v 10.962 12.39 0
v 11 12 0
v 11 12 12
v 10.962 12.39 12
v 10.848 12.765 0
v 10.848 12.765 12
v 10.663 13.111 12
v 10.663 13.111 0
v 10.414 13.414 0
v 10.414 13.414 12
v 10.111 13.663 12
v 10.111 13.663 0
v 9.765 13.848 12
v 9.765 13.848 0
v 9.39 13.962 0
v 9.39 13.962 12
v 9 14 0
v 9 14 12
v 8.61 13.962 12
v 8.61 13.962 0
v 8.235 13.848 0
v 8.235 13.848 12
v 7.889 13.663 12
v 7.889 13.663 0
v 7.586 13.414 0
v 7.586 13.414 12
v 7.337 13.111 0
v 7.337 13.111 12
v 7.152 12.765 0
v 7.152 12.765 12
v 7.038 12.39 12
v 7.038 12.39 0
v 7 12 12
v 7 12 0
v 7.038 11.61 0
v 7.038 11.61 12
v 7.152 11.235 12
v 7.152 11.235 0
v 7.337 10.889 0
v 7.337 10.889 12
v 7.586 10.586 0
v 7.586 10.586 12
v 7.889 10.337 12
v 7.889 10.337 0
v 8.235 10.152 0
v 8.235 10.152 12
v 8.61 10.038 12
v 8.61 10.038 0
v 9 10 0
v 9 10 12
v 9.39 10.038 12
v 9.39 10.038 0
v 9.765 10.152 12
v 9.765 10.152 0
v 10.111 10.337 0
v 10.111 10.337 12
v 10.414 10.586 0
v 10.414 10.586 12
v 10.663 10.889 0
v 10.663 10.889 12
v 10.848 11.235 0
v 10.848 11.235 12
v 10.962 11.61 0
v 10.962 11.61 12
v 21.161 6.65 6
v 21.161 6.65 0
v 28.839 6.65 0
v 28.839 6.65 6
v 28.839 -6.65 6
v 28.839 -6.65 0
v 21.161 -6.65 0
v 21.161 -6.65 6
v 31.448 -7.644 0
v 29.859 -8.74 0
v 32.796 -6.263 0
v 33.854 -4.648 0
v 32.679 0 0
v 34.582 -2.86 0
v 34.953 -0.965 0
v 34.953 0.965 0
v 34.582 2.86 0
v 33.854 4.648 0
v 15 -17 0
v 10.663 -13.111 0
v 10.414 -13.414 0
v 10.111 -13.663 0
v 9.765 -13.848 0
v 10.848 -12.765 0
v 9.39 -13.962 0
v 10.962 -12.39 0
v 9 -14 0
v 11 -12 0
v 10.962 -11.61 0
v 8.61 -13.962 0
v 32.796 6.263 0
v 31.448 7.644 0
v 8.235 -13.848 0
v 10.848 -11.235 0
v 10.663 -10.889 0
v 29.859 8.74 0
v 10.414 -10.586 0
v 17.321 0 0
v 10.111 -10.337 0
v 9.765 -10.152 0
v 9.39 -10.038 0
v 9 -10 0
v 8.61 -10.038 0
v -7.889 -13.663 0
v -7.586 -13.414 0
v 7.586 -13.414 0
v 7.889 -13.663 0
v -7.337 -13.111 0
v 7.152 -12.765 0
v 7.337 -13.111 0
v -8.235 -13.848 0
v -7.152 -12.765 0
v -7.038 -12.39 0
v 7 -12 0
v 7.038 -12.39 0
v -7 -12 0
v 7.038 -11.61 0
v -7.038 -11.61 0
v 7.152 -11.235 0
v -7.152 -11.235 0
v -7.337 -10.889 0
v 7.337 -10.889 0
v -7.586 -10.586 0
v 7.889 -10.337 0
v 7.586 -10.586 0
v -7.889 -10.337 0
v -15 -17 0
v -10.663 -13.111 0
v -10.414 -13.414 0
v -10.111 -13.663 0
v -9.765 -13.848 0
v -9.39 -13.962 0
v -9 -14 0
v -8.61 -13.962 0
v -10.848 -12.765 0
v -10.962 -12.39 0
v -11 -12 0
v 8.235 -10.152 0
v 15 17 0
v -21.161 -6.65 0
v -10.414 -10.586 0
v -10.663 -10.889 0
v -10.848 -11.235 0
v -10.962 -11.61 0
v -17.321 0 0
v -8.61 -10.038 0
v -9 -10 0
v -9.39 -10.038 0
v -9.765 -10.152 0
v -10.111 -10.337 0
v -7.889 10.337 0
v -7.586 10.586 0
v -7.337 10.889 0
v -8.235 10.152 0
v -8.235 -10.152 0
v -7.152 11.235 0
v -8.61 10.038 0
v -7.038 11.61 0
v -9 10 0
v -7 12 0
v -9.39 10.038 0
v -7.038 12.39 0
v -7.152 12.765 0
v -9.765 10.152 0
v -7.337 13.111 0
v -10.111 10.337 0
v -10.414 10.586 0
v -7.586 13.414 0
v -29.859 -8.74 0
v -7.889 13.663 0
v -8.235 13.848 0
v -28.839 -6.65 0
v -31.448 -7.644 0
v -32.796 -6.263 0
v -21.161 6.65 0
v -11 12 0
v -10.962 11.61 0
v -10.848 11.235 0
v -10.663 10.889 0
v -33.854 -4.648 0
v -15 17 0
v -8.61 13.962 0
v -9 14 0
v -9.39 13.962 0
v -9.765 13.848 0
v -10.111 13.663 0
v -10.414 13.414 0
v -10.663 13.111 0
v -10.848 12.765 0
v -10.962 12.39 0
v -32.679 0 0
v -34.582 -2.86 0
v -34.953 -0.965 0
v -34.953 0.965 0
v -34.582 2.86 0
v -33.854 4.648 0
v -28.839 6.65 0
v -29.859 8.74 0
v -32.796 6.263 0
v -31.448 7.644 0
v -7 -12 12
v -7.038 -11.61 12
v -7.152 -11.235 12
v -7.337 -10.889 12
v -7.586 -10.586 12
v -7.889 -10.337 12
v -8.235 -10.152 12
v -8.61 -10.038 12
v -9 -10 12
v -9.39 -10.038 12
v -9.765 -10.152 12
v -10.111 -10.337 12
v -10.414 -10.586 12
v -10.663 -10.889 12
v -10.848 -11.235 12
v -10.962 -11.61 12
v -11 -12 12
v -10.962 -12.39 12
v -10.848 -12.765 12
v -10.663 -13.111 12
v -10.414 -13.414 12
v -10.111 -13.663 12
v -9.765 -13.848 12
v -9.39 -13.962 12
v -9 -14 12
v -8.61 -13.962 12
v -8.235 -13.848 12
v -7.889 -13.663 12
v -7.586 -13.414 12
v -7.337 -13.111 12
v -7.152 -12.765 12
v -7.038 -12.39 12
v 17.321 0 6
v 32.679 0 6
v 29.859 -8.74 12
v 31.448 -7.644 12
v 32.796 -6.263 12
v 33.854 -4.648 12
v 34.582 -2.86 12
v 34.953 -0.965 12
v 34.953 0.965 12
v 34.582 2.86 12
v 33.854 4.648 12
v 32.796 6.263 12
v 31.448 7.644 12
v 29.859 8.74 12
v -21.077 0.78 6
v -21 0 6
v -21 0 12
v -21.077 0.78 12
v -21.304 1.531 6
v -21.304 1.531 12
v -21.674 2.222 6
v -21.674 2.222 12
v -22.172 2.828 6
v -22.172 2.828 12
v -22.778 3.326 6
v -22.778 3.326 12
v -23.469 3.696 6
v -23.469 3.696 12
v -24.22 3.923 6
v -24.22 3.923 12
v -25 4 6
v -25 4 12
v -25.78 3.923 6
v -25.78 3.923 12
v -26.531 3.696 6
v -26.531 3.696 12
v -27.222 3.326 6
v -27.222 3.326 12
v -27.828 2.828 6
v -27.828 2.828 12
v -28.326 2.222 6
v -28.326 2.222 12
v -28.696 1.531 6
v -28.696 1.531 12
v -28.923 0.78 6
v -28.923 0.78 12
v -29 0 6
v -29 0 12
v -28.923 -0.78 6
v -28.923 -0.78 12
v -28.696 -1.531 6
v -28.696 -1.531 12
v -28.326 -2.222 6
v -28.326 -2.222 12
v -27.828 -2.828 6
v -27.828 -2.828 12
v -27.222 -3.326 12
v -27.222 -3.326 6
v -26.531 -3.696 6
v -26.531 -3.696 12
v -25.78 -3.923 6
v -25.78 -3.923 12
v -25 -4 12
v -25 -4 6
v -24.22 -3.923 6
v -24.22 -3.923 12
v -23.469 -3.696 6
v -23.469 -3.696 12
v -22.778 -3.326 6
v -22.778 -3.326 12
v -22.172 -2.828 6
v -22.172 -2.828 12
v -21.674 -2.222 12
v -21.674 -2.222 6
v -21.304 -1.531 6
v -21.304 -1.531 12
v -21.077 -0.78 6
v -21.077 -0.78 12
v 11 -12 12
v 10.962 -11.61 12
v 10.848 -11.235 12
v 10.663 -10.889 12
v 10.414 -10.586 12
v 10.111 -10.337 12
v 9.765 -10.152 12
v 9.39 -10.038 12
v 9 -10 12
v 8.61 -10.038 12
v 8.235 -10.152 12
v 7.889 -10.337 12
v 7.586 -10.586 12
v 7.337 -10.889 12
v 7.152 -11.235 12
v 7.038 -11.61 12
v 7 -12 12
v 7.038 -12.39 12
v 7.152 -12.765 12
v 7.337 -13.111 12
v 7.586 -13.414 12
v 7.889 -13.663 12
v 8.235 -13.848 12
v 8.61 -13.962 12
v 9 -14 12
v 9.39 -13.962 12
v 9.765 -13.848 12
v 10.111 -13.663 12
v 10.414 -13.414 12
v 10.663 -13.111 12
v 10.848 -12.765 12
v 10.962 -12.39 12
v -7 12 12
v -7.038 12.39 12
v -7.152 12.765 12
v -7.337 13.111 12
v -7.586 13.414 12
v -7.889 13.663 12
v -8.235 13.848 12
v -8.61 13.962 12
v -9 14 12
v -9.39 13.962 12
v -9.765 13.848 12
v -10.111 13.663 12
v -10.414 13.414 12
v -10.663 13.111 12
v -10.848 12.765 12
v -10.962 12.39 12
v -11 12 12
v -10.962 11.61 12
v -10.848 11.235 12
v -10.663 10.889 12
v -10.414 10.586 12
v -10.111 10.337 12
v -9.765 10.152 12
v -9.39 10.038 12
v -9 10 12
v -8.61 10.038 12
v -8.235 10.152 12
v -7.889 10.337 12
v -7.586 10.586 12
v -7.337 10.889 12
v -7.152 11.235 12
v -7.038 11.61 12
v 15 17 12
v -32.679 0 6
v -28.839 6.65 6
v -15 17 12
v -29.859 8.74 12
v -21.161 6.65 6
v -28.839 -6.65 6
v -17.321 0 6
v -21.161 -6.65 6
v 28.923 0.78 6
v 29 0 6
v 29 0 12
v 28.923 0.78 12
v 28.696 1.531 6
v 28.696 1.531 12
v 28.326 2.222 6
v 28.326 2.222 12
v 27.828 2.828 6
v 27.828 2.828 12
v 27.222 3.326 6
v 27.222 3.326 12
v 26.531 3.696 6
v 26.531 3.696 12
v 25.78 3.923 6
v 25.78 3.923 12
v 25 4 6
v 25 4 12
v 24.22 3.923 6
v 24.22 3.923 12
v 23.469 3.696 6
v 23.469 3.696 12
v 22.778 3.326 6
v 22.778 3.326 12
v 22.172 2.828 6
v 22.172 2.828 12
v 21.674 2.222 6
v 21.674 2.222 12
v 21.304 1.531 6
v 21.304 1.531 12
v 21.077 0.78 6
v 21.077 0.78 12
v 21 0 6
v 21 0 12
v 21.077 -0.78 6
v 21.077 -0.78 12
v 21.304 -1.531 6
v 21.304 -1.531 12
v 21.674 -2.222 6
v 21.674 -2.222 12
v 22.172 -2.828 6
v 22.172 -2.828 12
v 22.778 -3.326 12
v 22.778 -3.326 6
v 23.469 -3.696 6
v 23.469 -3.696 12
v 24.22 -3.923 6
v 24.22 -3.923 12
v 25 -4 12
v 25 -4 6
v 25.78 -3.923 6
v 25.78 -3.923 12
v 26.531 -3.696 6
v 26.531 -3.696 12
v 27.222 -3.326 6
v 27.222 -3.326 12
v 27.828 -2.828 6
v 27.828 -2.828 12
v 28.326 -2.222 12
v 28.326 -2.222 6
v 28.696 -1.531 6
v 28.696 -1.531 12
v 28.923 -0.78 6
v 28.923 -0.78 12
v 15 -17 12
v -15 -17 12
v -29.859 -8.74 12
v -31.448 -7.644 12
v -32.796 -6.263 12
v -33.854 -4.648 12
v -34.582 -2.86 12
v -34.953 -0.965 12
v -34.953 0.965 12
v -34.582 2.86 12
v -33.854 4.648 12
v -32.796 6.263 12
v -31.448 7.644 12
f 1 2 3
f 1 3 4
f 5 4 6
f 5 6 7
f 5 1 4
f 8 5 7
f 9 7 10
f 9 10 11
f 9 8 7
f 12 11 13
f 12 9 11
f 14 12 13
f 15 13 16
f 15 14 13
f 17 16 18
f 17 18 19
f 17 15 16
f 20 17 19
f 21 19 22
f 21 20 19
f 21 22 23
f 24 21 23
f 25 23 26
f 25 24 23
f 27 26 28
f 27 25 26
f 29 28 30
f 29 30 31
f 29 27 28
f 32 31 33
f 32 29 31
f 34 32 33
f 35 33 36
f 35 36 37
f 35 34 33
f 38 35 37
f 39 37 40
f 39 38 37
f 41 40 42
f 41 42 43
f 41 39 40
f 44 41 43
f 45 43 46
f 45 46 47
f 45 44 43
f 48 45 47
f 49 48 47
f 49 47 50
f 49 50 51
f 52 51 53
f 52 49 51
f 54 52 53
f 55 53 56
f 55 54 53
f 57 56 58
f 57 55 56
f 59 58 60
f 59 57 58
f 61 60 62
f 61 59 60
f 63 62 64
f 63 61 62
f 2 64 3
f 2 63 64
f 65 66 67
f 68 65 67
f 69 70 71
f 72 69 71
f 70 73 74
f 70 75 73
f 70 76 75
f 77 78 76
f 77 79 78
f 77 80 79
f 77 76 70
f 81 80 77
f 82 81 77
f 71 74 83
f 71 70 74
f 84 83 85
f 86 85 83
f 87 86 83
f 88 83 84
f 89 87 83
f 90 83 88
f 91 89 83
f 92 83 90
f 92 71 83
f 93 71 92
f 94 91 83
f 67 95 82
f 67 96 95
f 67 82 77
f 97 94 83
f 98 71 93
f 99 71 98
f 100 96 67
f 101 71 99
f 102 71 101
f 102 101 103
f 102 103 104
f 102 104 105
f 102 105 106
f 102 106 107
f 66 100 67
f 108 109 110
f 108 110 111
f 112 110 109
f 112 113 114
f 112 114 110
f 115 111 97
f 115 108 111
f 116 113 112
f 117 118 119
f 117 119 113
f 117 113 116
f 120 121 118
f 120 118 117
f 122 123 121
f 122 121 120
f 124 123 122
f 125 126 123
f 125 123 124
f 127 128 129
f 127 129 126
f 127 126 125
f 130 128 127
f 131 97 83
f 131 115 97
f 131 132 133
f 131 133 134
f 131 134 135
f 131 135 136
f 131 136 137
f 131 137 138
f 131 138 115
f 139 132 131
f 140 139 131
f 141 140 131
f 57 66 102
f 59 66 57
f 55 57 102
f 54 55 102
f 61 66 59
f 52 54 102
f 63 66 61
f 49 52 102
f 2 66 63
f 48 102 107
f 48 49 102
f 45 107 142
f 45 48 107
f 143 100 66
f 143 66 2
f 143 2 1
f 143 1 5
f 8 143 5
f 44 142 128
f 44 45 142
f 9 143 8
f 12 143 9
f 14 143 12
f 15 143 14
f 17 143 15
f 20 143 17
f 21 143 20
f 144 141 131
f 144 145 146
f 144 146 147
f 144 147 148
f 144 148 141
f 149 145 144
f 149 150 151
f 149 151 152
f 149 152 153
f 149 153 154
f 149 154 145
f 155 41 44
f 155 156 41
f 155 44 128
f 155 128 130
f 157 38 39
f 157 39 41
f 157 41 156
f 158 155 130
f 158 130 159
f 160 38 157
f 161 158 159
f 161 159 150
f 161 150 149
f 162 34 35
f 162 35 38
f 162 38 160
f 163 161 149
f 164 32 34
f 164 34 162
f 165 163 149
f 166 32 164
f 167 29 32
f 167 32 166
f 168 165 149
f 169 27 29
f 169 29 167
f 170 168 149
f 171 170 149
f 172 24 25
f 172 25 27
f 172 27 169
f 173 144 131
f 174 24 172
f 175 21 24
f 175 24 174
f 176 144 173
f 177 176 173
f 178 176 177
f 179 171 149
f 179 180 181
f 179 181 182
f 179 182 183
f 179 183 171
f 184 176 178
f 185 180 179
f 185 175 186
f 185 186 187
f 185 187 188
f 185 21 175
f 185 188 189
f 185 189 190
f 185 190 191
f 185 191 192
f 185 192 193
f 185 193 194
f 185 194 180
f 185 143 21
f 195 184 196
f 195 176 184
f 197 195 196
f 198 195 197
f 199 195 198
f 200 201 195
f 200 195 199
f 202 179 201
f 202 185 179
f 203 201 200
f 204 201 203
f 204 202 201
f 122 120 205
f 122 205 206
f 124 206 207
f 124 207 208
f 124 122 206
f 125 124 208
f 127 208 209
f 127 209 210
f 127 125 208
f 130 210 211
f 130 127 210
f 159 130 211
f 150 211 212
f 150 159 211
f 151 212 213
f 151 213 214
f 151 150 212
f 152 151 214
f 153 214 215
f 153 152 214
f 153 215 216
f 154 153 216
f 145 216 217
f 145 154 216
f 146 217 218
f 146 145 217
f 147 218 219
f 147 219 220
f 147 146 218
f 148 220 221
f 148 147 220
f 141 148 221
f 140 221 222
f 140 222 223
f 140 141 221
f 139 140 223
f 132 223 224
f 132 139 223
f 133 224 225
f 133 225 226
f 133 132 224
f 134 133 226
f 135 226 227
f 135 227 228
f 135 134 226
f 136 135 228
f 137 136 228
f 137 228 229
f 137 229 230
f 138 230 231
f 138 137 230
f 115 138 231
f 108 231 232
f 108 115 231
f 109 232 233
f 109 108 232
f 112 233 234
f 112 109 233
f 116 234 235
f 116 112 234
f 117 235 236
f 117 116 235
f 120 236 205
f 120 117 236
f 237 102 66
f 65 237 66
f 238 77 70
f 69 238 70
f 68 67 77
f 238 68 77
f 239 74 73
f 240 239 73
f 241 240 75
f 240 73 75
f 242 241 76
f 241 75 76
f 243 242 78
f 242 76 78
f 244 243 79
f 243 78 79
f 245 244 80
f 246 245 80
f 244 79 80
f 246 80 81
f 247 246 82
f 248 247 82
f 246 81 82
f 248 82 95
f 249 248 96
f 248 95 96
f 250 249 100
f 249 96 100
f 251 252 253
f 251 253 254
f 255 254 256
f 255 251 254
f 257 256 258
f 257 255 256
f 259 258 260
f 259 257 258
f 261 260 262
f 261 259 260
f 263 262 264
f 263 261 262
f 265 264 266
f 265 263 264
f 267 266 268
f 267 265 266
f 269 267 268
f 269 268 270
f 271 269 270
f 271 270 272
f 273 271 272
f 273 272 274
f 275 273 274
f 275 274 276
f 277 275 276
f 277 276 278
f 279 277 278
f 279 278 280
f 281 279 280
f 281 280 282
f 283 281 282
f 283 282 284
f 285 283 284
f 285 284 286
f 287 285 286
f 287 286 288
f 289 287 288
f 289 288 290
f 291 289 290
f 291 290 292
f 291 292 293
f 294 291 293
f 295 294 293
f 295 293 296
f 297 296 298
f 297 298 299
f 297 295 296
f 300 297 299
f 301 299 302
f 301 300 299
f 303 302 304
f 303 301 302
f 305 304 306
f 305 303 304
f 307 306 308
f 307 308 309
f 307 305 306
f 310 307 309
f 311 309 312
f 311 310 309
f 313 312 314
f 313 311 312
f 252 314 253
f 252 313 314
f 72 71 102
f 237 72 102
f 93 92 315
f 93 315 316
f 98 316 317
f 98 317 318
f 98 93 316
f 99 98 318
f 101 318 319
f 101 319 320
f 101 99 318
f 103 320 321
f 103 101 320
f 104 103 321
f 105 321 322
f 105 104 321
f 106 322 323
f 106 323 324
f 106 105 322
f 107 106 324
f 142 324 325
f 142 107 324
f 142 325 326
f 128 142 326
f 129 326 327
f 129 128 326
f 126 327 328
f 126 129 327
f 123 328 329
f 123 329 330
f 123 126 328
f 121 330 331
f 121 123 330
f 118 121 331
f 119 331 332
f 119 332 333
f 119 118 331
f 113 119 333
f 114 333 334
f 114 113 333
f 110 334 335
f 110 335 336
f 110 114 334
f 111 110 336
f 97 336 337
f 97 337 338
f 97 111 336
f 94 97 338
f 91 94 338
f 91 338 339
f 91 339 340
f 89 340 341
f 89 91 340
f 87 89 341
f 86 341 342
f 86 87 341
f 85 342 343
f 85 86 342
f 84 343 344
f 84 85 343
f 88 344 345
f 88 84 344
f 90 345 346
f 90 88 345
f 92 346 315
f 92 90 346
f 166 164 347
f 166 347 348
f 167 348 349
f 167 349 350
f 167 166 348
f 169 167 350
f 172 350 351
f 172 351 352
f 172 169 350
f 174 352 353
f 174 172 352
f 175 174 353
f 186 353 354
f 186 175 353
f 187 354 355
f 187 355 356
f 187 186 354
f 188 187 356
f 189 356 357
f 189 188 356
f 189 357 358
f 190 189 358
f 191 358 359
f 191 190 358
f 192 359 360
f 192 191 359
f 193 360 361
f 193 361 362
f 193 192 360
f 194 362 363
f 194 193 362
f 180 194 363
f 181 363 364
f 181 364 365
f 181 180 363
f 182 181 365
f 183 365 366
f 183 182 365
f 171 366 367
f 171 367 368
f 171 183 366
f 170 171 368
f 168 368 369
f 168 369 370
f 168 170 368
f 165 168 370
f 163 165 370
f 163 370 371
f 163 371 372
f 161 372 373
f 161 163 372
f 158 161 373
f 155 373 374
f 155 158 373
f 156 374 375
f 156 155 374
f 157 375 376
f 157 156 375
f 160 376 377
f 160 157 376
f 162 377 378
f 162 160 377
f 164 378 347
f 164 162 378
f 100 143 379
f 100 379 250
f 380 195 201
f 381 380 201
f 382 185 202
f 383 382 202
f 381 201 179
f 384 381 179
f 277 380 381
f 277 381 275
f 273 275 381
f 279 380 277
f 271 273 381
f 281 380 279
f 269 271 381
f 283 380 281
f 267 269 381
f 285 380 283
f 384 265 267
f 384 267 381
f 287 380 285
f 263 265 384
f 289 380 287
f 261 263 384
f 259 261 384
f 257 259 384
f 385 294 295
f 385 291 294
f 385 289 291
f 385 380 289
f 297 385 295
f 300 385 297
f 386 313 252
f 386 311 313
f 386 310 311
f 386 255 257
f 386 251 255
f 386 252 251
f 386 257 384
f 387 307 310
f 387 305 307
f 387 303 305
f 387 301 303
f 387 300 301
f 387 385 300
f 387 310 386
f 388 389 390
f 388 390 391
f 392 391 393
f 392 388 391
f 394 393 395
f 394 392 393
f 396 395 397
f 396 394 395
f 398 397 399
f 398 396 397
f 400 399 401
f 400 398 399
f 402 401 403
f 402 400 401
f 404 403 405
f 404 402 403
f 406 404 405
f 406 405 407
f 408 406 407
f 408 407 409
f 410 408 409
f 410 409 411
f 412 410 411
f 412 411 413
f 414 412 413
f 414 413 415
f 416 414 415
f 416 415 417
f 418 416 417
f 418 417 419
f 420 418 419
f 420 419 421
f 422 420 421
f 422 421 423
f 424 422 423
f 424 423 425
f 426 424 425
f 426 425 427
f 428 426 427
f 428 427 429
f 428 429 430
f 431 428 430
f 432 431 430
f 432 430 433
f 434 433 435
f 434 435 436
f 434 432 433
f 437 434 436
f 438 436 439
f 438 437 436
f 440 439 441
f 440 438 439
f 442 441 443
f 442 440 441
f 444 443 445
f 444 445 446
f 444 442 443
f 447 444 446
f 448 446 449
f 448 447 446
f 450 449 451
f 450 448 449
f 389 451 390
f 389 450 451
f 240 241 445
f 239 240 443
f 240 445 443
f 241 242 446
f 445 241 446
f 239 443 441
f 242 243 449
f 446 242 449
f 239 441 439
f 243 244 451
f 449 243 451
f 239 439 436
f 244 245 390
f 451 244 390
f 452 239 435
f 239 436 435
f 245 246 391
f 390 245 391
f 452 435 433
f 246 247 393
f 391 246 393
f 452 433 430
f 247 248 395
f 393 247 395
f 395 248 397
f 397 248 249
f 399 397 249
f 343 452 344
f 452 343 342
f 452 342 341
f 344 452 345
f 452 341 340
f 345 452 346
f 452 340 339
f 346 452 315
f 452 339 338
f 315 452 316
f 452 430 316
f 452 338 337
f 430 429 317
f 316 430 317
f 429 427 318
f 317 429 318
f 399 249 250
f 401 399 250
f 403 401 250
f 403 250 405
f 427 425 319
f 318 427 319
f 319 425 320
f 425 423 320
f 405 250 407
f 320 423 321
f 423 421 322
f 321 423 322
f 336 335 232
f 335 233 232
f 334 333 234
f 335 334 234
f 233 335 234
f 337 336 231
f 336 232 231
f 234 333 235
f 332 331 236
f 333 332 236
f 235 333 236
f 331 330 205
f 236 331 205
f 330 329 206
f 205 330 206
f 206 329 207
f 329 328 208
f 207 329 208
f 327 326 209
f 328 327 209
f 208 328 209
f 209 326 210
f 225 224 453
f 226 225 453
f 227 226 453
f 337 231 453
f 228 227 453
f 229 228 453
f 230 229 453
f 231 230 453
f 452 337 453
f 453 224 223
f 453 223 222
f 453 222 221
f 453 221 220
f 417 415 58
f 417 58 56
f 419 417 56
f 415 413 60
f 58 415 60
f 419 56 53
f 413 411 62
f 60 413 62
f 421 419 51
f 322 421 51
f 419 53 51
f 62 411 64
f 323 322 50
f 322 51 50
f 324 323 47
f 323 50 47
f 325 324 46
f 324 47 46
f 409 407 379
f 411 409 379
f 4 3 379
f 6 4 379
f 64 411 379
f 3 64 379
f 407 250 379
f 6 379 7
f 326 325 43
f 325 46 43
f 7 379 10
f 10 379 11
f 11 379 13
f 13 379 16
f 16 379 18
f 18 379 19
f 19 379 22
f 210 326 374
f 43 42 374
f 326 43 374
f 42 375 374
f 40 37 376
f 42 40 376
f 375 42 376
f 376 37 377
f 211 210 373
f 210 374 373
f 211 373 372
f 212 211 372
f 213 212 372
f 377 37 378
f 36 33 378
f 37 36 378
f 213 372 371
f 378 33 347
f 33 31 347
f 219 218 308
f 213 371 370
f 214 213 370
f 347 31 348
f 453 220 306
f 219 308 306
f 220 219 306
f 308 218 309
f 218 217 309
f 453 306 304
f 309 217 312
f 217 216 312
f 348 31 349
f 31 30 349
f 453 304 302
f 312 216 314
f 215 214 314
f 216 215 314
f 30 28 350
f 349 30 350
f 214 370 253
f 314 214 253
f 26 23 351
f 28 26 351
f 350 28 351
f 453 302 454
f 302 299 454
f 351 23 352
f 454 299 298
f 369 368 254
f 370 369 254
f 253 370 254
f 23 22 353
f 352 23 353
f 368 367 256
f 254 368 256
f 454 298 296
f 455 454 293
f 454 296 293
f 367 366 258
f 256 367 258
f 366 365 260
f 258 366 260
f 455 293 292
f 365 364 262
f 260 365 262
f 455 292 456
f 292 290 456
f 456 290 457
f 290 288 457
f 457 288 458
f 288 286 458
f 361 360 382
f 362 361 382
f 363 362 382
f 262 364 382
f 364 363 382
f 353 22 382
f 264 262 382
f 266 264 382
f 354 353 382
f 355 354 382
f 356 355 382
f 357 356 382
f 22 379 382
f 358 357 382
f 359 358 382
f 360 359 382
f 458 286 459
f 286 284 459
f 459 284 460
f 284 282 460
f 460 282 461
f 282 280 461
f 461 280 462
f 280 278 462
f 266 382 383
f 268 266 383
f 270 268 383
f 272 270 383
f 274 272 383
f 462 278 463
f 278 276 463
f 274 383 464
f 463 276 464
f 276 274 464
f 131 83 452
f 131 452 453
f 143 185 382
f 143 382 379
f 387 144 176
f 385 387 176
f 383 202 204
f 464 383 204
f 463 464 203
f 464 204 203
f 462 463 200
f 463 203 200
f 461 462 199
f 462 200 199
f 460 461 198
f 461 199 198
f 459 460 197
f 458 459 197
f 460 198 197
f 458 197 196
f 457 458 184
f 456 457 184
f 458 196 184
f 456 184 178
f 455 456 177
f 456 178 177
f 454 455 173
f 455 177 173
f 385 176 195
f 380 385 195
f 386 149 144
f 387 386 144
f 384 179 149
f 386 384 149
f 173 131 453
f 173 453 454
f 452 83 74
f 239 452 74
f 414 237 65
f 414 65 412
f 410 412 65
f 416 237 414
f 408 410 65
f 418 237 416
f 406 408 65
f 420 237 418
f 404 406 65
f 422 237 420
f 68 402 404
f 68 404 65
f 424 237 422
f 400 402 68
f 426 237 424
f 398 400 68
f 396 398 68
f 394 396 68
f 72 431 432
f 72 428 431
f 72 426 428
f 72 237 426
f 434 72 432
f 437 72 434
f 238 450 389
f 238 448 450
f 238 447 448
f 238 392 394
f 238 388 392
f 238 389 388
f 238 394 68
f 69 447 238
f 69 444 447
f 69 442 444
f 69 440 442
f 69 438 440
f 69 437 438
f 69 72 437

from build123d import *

# Parameters (mm, degrees)
SKETCH_R     = 4
SKETCH_R_2   = 2
PAD_DEPTH    = 12
POCKET_DEPTH = 6


with BuildPart() as part:
    # Sketch → Pad (new body)
    with BuildSketch(Plane.XY):
        with BuildLine():
            Line((-15, 17), (15, 17))
            Line((15, 17), (29.858612, 8.74036))
            ThreePointArc((29.858612, -8.74036), (35, 0), (29.858612, 8.74036))
            Line((15, -17), (29.858612, -8.74036))
            Line((15, -17), (-15, -17))
            Line((-15, -17), (-29.858612, -8.74036))
            ThreePointArc((-29.858612, 8.74036), (-35, 0), (-29.858612, -8.74036))
            Line((-15, 17), (-29.858612, 8.74036))
        make_face()
        with Locations((-25, 0)):
            Circle(SKETCH_R, mode=Mode.SUBTRACT)
        with Locations((25, 0)):
            Circle(SKETCH_R, mode=Mode.SUBTRACT)
        with Locations((-9, 12)):
            Circle(SKETCH_R_2, mode=Mode.SUBTRACT)
        with Locations((9, 12)):
            Circle(SKETCH_R_2, mode=Mode.SUBTRACT)
        with Locations((9, -12)):
            Circle(SKETCH_R_2, mode=Mode.SUBTRACT)
        with Locations((-9, -12)):
            Circle(SKETCH_R_2, mode=Mode.SUBTRACT)
    extrude(amount=PAD_DEPTH)

    # Sketch001 (on Face15 of Pad) → Pocket (cut)
    with BuildSketch(Plane(origin=(0, 0, 0), x_dir=(1, 0, 0), z_dir=(0, 0, -1))):
        Polygon((-28.839379, 6.65), (-32.678759, 0), (-28.839379, -6.65), (-21.160621, -6.65), (-17.321241, 0), (-21.160621, 6.65), align=None)
        Polygon((17.321241, 0), (21.160621, -6.65), (28.839379, -6.65), (32.678759, 0), (28.839379, 6.65), (21.160621, 6.65), align=None)
    extrude(amount=-POCKET_DEPTH, mode=Mode.SUBTRACT)


solid = part.part
